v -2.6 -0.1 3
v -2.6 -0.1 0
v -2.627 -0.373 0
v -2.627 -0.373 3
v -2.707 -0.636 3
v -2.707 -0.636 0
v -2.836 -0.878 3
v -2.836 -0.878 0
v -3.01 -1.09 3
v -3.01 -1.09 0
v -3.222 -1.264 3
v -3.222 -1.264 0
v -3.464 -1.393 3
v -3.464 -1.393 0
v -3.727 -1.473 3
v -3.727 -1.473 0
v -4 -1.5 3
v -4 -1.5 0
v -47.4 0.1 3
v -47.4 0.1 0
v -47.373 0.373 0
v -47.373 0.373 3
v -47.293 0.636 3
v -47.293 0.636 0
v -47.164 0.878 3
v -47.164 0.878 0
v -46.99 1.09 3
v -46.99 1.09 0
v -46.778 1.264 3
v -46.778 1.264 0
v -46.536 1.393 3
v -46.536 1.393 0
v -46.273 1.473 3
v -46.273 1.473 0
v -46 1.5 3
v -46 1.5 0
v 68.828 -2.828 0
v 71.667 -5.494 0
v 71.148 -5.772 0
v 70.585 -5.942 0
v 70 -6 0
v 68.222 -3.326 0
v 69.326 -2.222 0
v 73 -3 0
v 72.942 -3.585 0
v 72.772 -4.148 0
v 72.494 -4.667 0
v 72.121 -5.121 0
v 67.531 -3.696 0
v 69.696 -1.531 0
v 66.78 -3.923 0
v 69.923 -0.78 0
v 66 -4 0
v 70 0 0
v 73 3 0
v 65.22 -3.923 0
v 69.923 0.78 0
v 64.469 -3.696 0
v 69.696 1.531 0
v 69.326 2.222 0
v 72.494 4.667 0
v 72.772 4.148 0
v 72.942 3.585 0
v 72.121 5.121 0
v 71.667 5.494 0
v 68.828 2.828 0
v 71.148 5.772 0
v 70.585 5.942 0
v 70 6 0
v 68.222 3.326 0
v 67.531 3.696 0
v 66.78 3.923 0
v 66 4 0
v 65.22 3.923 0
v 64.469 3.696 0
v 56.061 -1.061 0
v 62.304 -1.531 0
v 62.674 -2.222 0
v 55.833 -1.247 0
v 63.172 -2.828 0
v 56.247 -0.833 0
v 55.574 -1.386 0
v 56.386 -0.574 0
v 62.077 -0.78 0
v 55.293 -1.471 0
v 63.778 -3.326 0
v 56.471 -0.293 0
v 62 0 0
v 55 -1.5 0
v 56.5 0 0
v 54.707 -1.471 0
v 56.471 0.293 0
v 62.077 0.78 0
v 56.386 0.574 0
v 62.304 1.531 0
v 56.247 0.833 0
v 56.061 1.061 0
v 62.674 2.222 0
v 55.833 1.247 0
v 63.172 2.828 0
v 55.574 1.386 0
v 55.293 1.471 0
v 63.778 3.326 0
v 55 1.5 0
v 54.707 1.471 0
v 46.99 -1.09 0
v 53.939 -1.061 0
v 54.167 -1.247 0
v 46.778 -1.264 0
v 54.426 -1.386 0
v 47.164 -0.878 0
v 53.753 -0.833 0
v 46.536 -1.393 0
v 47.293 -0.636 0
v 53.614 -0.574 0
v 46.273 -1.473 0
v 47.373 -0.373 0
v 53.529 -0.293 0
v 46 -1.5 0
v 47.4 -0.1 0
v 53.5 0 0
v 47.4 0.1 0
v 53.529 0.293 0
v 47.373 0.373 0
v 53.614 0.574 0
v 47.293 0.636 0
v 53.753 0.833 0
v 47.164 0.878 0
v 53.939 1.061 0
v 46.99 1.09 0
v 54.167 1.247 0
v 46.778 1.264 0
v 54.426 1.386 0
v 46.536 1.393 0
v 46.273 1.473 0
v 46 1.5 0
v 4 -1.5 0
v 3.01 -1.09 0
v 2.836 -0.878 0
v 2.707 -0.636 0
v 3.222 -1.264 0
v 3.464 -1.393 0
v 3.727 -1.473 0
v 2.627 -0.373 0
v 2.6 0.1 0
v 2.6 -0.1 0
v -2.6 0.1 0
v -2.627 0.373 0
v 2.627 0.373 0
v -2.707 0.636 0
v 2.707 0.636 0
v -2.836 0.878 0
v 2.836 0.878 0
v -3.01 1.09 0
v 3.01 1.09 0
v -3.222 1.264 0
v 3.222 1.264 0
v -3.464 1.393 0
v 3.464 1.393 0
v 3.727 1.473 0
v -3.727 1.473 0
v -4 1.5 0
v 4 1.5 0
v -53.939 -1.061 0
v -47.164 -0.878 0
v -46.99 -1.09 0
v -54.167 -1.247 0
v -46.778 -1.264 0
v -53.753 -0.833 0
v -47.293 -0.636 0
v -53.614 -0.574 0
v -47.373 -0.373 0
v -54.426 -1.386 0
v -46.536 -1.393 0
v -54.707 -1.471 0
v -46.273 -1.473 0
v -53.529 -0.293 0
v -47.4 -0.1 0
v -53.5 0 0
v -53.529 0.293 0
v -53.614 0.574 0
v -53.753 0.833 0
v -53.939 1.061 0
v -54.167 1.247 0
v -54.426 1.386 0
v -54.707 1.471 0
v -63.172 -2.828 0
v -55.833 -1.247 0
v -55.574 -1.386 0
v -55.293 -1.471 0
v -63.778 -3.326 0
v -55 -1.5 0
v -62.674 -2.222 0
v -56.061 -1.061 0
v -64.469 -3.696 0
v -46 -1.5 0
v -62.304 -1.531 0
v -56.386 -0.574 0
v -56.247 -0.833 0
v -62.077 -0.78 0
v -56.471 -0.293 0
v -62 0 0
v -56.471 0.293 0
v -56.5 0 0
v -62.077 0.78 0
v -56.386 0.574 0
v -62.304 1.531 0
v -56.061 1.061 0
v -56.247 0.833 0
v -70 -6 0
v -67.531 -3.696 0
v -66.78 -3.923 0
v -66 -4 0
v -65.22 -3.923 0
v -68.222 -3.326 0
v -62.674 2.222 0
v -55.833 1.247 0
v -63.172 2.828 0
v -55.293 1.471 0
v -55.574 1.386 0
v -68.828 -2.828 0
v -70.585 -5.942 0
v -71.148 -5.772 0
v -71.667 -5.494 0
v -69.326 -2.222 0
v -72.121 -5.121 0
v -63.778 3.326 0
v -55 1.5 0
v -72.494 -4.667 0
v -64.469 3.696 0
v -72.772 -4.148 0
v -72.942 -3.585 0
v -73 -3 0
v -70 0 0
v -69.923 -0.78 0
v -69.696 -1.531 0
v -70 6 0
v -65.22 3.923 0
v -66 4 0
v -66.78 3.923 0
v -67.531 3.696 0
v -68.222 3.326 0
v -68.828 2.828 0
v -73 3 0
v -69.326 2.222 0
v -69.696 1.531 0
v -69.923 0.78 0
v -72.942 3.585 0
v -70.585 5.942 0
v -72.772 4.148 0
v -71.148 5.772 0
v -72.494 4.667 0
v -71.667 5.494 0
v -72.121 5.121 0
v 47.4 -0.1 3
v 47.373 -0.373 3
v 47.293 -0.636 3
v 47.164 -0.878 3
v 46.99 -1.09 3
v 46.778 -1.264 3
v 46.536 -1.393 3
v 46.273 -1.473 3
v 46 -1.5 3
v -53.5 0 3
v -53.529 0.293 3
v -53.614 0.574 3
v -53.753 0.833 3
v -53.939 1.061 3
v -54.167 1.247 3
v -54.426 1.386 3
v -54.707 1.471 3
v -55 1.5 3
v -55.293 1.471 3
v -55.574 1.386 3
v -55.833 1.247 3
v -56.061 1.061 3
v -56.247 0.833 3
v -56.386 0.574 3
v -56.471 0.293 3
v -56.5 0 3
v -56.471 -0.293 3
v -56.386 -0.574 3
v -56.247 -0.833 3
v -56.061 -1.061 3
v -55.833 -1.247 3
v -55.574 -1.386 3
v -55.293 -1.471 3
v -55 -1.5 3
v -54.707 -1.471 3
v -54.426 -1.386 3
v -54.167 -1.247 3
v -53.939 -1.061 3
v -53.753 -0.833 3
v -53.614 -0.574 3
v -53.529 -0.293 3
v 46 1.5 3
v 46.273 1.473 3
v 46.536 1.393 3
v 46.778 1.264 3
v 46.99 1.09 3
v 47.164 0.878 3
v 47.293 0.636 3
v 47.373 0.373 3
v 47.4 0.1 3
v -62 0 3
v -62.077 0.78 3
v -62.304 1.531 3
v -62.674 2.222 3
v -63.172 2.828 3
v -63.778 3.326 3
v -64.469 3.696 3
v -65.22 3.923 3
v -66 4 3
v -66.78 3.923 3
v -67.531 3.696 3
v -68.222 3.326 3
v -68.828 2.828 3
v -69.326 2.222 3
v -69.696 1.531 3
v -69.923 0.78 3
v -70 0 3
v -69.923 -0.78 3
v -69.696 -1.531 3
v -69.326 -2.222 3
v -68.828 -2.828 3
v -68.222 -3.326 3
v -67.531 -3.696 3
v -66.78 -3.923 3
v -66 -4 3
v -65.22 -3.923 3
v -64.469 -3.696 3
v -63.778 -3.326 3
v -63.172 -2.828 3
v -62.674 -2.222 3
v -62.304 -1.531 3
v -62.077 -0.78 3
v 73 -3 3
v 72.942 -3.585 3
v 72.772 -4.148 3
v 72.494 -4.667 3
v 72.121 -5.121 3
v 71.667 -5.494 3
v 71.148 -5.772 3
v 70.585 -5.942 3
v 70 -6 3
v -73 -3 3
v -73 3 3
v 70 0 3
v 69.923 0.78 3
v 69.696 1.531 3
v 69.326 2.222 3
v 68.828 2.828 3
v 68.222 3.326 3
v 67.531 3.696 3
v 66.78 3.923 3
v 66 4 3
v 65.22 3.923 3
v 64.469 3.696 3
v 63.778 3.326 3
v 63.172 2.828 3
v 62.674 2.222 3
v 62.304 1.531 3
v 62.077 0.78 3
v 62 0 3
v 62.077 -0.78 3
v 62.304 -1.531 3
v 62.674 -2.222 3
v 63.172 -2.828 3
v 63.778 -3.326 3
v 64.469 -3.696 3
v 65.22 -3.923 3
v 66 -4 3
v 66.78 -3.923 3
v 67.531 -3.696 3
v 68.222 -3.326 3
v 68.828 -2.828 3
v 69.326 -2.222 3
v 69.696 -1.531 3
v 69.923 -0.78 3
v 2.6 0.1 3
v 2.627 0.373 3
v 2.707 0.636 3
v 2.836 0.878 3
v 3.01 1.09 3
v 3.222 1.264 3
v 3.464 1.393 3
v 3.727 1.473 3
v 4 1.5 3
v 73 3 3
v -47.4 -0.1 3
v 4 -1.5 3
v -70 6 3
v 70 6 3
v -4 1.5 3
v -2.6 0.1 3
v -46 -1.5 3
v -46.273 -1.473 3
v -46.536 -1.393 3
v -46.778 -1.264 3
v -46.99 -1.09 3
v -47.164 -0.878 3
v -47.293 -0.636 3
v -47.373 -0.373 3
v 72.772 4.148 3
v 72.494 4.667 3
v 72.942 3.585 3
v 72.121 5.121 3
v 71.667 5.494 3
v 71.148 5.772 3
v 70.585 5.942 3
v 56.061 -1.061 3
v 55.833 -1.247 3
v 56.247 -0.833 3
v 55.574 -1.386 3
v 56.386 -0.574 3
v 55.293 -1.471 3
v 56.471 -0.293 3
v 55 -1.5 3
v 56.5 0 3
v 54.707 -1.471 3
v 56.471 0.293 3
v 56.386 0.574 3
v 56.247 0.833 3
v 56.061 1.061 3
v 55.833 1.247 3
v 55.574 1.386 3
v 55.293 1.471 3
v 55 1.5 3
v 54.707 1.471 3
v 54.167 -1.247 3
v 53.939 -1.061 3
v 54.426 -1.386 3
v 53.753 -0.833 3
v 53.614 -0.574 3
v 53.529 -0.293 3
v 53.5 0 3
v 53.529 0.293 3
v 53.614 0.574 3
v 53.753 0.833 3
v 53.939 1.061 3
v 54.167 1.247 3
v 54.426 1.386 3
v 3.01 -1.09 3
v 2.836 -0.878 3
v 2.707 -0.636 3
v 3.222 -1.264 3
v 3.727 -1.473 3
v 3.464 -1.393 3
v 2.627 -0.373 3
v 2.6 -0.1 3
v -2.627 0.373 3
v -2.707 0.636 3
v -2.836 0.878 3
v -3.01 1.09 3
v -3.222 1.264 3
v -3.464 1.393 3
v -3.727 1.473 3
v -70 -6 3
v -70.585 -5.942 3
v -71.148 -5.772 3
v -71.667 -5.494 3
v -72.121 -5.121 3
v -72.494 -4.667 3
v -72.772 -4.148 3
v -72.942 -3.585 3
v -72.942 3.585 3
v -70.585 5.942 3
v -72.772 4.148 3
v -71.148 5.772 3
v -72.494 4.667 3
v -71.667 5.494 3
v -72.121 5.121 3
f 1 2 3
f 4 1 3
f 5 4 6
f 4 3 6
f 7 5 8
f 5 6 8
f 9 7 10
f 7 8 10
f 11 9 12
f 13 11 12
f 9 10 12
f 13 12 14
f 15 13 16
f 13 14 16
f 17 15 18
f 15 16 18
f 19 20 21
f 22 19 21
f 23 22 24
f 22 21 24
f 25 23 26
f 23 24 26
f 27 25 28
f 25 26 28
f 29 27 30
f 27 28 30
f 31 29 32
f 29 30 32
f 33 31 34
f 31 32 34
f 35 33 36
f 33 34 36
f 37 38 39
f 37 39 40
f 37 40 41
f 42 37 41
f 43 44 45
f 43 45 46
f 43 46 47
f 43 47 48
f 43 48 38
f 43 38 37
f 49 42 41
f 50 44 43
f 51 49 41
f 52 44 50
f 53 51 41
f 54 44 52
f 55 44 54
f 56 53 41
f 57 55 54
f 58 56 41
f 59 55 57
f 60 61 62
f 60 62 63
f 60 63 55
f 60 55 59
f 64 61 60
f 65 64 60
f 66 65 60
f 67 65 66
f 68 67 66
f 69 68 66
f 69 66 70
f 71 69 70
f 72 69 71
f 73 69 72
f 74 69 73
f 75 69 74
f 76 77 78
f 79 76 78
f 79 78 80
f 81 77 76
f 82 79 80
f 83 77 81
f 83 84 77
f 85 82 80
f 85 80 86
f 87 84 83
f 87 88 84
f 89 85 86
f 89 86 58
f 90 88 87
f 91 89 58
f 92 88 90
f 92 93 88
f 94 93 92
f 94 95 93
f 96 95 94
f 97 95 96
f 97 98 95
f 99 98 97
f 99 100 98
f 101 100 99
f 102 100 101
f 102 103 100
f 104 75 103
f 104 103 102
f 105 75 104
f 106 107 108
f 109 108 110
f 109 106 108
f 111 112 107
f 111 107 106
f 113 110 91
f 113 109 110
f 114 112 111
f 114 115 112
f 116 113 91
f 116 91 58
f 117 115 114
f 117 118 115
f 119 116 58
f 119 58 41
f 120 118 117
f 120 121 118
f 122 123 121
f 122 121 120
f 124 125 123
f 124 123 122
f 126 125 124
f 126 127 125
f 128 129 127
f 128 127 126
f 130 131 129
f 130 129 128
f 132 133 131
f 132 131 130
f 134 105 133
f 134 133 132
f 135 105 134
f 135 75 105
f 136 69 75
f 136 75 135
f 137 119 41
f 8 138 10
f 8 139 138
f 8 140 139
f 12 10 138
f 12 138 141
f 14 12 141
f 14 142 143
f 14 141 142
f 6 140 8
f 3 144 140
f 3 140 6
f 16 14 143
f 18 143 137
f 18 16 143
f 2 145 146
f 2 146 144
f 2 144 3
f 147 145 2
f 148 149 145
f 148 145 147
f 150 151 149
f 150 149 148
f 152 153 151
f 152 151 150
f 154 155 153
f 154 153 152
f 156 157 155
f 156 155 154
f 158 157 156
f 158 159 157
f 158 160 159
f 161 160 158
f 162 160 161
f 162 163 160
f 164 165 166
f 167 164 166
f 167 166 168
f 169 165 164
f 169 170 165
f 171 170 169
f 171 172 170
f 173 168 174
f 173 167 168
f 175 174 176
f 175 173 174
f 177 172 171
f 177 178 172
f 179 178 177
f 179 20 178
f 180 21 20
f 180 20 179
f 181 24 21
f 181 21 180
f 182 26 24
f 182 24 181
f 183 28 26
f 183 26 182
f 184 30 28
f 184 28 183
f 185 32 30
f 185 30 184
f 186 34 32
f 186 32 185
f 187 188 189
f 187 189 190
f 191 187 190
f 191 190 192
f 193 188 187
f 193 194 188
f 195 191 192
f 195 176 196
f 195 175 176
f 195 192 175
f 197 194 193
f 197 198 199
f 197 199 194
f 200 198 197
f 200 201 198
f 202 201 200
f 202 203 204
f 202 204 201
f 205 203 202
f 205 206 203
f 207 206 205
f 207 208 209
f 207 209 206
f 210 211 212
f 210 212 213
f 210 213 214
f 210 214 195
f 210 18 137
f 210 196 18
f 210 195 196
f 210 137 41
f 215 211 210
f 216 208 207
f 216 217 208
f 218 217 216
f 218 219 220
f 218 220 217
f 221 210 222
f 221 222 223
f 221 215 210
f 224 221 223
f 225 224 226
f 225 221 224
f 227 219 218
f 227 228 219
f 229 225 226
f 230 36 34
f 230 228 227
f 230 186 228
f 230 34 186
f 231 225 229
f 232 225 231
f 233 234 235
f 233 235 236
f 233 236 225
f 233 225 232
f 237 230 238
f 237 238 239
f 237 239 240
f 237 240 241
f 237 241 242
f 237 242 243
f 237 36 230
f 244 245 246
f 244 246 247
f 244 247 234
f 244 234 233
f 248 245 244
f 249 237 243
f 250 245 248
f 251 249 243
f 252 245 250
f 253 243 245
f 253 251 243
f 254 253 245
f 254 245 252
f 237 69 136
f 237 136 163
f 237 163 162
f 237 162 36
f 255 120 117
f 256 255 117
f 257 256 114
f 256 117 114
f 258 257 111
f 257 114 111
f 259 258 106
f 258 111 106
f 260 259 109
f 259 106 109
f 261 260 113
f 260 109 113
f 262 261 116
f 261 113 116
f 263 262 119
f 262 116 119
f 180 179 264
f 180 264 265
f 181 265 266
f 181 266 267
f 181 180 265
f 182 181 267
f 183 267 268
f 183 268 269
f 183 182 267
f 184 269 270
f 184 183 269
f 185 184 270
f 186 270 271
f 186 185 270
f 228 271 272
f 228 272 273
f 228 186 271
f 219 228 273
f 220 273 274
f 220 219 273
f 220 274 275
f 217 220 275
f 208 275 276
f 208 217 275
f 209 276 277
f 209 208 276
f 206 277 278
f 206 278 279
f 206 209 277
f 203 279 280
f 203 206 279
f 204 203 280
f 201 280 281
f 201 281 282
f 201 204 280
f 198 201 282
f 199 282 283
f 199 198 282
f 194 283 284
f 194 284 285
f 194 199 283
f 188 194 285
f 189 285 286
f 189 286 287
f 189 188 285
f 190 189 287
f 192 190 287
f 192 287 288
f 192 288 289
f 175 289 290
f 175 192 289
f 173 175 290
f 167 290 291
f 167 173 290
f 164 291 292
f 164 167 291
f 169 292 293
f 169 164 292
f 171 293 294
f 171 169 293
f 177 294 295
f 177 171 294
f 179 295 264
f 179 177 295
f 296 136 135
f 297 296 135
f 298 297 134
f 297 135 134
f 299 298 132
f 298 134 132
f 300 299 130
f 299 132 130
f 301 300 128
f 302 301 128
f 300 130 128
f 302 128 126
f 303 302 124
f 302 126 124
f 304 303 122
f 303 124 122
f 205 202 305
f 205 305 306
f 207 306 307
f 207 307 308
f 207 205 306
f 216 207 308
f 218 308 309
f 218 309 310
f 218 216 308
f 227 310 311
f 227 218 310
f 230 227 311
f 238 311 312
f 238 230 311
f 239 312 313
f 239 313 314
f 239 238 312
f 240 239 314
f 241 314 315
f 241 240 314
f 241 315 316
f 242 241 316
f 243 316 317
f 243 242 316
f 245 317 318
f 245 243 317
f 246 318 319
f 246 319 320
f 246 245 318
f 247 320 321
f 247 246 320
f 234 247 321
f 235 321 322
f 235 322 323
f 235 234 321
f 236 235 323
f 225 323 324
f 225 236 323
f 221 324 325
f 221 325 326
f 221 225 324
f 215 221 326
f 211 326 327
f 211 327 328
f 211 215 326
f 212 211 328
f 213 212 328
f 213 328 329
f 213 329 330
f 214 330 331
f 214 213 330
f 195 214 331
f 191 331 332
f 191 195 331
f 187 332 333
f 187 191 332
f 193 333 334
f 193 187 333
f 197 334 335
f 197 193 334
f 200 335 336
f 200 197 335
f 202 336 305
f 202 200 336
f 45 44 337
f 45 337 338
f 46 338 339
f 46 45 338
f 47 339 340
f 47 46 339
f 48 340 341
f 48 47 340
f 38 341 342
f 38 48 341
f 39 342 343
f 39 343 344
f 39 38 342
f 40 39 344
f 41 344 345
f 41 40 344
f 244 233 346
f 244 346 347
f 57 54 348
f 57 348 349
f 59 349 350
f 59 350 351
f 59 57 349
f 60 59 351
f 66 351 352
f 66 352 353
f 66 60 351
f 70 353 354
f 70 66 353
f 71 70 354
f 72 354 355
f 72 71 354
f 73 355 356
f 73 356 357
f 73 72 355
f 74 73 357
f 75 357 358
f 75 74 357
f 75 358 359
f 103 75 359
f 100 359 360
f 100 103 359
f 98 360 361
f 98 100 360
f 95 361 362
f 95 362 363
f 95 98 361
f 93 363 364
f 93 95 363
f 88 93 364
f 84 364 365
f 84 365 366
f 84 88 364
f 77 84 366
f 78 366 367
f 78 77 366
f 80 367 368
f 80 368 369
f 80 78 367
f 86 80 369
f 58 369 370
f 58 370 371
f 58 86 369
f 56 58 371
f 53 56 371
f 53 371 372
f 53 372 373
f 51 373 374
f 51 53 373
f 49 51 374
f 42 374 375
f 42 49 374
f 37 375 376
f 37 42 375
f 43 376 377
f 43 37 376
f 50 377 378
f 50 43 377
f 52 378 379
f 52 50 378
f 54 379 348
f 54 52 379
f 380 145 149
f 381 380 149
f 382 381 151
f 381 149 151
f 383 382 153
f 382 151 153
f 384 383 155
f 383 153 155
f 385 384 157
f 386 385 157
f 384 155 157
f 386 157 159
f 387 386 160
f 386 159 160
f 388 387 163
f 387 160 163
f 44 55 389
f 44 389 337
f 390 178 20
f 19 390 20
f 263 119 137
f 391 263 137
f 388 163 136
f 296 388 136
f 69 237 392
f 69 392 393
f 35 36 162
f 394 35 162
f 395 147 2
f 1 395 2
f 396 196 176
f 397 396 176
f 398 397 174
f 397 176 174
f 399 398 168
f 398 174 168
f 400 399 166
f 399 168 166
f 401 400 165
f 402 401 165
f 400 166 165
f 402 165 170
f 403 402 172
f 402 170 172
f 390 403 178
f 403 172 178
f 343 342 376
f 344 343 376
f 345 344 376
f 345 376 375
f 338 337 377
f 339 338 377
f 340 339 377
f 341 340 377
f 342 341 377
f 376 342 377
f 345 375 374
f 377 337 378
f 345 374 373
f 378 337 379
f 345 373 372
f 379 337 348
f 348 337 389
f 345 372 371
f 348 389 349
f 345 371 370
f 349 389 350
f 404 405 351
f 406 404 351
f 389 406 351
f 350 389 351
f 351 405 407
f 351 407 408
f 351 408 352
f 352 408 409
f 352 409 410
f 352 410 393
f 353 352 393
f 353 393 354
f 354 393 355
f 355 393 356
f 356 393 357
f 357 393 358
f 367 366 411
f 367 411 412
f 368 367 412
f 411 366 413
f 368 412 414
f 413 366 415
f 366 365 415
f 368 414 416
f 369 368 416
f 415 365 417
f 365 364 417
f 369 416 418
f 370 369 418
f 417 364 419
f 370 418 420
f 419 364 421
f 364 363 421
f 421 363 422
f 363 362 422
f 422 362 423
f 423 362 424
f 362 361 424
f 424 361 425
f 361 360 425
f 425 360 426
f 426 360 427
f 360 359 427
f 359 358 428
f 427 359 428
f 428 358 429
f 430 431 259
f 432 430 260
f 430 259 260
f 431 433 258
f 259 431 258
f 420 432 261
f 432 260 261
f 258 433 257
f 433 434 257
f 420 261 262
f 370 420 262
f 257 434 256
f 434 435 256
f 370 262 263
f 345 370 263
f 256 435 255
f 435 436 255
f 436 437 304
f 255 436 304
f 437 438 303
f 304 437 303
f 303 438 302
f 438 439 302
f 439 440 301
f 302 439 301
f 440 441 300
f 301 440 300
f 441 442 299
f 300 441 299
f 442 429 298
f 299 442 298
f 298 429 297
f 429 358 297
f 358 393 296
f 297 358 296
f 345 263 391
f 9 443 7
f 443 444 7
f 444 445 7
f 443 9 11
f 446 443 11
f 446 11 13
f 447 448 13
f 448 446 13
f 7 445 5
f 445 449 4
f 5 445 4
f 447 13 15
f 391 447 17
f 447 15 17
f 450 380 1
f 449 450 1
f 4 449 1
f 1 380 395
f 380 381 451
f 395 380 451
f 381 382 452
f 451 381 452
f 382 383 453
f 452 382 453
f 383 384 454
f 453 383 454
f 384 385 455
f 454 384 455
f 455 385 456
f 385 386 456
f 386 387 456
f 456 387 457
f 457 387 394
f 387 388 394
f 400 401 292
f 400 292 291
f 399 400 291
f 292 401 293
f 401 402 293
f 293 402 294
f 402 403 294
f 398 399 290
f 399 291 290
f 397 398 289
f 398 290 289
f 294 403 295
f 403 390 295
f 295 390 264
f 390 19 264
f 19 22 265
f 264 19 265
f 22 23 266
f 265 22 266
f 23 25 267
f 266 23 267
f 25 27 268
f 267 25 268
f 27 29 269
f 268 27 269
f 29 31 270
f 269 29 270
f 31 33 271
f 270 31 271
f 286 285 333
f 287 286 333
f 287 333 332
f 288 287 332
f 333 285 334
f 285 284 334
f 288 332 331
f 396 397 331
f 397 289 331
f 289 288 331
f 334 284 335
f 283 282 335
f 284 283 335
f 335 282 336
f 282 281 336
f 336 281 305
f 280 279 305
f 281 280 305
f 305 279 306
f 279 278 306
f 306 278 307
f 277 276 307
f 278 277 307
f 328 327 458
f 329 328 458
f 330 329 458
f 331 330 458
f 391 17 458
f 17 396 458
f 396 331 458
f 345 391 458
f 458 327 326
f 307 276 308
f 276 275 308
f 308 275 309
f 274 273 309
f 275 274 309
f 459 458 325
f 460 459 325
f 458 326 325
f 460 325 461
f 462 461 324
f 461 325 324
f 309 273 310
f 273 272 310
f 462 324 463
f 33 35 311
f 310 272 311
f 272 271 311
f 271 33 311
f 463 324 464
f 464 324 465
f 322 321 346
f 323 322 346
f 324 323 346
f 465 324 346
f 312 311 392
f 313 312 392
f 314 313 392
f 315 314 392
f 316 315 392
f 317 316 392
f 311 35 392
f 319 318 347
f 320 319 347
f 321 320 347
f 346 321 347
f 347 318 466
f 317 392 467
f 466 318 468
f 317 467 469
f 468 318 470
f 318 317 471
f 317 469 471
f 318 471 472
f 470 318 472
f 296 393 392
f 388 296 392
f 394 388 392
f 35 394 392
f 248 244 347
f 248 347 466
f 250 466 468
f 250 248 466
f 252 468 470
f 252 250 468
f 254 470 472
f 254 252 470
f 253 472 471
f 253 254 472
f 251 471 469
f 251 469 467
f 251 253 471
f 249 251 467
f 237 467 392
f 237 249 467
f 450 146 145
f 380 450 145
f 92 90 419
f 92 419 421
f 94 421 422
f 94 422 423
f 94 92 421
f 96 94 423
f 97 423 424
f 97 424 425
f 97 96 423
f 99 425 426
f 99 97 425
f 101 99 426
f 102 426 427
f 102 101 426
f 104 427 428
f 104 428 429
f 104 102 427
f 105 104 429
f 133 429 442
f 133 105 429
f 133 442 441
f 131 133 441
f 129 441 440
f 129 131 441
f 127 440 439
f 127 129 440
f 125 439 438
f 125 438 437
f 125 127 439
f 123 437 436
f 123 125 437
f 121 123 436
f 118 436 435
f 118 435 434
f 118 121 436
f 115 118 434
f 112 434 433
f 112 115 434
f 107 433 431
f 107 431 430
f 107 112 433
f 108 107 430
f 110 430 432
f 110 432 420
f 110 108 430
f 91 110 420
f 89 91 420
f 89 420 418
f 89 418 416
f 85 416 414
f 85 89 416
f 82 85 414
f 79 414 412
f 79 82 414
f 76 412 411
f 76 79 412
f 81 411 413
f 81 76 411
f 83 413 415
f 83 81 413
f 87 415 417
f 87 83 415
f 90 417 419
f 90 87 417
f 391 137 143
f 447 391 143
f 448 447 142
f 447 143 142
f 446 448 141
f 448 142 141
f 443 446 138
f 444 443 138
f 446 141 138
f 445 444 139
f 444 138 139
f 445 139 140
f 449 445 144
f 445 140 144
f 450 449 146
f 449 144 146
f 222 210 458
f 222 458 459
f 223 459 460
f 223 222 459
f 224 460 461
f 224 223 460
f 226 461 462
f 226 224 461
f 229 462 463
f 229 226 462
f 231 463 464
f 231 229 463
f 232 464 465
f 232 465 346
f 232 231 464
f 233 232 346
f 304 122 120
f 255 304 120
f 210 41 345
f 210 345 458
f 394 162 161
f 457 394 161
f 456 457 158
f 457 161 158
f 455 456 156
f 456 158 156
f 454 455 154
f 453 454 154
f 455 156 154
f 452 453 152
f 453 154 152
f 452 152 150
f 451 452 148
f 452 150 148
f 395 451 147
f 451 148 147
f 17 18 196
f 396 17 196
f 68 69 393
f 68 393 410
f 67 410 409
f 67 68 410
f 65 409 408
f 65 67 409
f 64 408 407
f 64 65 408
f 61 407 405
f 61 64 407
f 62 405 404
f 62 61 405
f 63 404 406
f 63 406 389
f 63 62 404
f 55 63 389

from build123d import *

# Parameters (mm, degrees)
SKETCH1_R           = 4
SKETCH1_R_2         = 1.5
BOSS_EXTRUDE1_DEPTH = 3


with BuildPart() as part:
    # Sketch1 → Boss-Extrude1 (new body)
    with BuildSketch(Plane.XY):
        with BuildLine():
            Line((-70, 6), (70, 6))
            ThreePointArc((70, 6), (72.121320344, 5.121320344), (73, 3))
            Line((73, 3), (73, -3))
            ThreePointArc((73, -3), (72.121320344, -5.121320344), (70, -6))
            Line((70, -6), (-70, -6))
            ThreePointArc((-70, -6), (-72.121320344, -5.121320344), (-73, -3))
            Line((-73, -3), (-73, 3))
            ThreePointArc((-73, 3), (-72.121320344, 5.121320344), (-70, 6))
        make_face()
        with Locations((-66, 0)):
            Circle(SKETCH1_R, mode=Mode.SUBTRACT)
        with Locations((66, 0)):
            Circle(SKETCH1_R, mode=Mode.SUBTRACT)
        with Locations((-55, 0)):
            Circle(SKETCH1_R_2, mode=Mode.SUBTRACT)
        with Locations((55, 0)):
            Circle(SKETCH1_R_2, mode=Mode.SUBTRACT)
        with BuildLine():
            Line((-46, 1.5), (-4, 1.5))
            ThreePointArc((-4, 1.5), (-3.010050506, 1.089949494), (-2.6, 0.1))
            Line((-2.6, 0.1), (-2.6, -0.1))
            ThreePointArc((-2.6, -0.1), (-3.010050506, -1.089949494), (-4, -1.5))
            Line((-4, -1.5), (-46, -1.5))
            ThreePointArc((-46, -1.5), (-46.989949494, -1.089949494), (-47.4, -0.1))
            Line((-47.4, -0.1), (-47.4, 0.1))
            ThreePointArc((-47.4, 0.1), (-46.989949494, 1.089949494), (-46, 1.5))
        make_face(mode=Mode.SUBTRACT)
        with BuildLine():
            Line((4, 1.5), (46, 1.5))
            ThreePointArc((46, 1.5), (46.989949494, 1.089949494), (47.4, 0.1))
            Line((47.4, 0.1), (47.4, -0.1))
            ThreePointArc((47.4, -0.1), (46.989949494, -1.089949494), (46, -1.5))
            Line((46, -1.5), (4, -1.5))
            ThreePointArc((4, -1.5), (3.010050506, -1.089949494), (2.6, -0.1))
            Line((2.6, -0.1), (2.6, 0.1))
            ThreePointArc((2.6, 0.1), (3.010050506, 1.089949494), (4, 1.5))
        make_face(mode=Mode.SUBTRACT)
    extrude(amount=BOSS_EXTRUDE1_DEPTH)


solid = part.part
